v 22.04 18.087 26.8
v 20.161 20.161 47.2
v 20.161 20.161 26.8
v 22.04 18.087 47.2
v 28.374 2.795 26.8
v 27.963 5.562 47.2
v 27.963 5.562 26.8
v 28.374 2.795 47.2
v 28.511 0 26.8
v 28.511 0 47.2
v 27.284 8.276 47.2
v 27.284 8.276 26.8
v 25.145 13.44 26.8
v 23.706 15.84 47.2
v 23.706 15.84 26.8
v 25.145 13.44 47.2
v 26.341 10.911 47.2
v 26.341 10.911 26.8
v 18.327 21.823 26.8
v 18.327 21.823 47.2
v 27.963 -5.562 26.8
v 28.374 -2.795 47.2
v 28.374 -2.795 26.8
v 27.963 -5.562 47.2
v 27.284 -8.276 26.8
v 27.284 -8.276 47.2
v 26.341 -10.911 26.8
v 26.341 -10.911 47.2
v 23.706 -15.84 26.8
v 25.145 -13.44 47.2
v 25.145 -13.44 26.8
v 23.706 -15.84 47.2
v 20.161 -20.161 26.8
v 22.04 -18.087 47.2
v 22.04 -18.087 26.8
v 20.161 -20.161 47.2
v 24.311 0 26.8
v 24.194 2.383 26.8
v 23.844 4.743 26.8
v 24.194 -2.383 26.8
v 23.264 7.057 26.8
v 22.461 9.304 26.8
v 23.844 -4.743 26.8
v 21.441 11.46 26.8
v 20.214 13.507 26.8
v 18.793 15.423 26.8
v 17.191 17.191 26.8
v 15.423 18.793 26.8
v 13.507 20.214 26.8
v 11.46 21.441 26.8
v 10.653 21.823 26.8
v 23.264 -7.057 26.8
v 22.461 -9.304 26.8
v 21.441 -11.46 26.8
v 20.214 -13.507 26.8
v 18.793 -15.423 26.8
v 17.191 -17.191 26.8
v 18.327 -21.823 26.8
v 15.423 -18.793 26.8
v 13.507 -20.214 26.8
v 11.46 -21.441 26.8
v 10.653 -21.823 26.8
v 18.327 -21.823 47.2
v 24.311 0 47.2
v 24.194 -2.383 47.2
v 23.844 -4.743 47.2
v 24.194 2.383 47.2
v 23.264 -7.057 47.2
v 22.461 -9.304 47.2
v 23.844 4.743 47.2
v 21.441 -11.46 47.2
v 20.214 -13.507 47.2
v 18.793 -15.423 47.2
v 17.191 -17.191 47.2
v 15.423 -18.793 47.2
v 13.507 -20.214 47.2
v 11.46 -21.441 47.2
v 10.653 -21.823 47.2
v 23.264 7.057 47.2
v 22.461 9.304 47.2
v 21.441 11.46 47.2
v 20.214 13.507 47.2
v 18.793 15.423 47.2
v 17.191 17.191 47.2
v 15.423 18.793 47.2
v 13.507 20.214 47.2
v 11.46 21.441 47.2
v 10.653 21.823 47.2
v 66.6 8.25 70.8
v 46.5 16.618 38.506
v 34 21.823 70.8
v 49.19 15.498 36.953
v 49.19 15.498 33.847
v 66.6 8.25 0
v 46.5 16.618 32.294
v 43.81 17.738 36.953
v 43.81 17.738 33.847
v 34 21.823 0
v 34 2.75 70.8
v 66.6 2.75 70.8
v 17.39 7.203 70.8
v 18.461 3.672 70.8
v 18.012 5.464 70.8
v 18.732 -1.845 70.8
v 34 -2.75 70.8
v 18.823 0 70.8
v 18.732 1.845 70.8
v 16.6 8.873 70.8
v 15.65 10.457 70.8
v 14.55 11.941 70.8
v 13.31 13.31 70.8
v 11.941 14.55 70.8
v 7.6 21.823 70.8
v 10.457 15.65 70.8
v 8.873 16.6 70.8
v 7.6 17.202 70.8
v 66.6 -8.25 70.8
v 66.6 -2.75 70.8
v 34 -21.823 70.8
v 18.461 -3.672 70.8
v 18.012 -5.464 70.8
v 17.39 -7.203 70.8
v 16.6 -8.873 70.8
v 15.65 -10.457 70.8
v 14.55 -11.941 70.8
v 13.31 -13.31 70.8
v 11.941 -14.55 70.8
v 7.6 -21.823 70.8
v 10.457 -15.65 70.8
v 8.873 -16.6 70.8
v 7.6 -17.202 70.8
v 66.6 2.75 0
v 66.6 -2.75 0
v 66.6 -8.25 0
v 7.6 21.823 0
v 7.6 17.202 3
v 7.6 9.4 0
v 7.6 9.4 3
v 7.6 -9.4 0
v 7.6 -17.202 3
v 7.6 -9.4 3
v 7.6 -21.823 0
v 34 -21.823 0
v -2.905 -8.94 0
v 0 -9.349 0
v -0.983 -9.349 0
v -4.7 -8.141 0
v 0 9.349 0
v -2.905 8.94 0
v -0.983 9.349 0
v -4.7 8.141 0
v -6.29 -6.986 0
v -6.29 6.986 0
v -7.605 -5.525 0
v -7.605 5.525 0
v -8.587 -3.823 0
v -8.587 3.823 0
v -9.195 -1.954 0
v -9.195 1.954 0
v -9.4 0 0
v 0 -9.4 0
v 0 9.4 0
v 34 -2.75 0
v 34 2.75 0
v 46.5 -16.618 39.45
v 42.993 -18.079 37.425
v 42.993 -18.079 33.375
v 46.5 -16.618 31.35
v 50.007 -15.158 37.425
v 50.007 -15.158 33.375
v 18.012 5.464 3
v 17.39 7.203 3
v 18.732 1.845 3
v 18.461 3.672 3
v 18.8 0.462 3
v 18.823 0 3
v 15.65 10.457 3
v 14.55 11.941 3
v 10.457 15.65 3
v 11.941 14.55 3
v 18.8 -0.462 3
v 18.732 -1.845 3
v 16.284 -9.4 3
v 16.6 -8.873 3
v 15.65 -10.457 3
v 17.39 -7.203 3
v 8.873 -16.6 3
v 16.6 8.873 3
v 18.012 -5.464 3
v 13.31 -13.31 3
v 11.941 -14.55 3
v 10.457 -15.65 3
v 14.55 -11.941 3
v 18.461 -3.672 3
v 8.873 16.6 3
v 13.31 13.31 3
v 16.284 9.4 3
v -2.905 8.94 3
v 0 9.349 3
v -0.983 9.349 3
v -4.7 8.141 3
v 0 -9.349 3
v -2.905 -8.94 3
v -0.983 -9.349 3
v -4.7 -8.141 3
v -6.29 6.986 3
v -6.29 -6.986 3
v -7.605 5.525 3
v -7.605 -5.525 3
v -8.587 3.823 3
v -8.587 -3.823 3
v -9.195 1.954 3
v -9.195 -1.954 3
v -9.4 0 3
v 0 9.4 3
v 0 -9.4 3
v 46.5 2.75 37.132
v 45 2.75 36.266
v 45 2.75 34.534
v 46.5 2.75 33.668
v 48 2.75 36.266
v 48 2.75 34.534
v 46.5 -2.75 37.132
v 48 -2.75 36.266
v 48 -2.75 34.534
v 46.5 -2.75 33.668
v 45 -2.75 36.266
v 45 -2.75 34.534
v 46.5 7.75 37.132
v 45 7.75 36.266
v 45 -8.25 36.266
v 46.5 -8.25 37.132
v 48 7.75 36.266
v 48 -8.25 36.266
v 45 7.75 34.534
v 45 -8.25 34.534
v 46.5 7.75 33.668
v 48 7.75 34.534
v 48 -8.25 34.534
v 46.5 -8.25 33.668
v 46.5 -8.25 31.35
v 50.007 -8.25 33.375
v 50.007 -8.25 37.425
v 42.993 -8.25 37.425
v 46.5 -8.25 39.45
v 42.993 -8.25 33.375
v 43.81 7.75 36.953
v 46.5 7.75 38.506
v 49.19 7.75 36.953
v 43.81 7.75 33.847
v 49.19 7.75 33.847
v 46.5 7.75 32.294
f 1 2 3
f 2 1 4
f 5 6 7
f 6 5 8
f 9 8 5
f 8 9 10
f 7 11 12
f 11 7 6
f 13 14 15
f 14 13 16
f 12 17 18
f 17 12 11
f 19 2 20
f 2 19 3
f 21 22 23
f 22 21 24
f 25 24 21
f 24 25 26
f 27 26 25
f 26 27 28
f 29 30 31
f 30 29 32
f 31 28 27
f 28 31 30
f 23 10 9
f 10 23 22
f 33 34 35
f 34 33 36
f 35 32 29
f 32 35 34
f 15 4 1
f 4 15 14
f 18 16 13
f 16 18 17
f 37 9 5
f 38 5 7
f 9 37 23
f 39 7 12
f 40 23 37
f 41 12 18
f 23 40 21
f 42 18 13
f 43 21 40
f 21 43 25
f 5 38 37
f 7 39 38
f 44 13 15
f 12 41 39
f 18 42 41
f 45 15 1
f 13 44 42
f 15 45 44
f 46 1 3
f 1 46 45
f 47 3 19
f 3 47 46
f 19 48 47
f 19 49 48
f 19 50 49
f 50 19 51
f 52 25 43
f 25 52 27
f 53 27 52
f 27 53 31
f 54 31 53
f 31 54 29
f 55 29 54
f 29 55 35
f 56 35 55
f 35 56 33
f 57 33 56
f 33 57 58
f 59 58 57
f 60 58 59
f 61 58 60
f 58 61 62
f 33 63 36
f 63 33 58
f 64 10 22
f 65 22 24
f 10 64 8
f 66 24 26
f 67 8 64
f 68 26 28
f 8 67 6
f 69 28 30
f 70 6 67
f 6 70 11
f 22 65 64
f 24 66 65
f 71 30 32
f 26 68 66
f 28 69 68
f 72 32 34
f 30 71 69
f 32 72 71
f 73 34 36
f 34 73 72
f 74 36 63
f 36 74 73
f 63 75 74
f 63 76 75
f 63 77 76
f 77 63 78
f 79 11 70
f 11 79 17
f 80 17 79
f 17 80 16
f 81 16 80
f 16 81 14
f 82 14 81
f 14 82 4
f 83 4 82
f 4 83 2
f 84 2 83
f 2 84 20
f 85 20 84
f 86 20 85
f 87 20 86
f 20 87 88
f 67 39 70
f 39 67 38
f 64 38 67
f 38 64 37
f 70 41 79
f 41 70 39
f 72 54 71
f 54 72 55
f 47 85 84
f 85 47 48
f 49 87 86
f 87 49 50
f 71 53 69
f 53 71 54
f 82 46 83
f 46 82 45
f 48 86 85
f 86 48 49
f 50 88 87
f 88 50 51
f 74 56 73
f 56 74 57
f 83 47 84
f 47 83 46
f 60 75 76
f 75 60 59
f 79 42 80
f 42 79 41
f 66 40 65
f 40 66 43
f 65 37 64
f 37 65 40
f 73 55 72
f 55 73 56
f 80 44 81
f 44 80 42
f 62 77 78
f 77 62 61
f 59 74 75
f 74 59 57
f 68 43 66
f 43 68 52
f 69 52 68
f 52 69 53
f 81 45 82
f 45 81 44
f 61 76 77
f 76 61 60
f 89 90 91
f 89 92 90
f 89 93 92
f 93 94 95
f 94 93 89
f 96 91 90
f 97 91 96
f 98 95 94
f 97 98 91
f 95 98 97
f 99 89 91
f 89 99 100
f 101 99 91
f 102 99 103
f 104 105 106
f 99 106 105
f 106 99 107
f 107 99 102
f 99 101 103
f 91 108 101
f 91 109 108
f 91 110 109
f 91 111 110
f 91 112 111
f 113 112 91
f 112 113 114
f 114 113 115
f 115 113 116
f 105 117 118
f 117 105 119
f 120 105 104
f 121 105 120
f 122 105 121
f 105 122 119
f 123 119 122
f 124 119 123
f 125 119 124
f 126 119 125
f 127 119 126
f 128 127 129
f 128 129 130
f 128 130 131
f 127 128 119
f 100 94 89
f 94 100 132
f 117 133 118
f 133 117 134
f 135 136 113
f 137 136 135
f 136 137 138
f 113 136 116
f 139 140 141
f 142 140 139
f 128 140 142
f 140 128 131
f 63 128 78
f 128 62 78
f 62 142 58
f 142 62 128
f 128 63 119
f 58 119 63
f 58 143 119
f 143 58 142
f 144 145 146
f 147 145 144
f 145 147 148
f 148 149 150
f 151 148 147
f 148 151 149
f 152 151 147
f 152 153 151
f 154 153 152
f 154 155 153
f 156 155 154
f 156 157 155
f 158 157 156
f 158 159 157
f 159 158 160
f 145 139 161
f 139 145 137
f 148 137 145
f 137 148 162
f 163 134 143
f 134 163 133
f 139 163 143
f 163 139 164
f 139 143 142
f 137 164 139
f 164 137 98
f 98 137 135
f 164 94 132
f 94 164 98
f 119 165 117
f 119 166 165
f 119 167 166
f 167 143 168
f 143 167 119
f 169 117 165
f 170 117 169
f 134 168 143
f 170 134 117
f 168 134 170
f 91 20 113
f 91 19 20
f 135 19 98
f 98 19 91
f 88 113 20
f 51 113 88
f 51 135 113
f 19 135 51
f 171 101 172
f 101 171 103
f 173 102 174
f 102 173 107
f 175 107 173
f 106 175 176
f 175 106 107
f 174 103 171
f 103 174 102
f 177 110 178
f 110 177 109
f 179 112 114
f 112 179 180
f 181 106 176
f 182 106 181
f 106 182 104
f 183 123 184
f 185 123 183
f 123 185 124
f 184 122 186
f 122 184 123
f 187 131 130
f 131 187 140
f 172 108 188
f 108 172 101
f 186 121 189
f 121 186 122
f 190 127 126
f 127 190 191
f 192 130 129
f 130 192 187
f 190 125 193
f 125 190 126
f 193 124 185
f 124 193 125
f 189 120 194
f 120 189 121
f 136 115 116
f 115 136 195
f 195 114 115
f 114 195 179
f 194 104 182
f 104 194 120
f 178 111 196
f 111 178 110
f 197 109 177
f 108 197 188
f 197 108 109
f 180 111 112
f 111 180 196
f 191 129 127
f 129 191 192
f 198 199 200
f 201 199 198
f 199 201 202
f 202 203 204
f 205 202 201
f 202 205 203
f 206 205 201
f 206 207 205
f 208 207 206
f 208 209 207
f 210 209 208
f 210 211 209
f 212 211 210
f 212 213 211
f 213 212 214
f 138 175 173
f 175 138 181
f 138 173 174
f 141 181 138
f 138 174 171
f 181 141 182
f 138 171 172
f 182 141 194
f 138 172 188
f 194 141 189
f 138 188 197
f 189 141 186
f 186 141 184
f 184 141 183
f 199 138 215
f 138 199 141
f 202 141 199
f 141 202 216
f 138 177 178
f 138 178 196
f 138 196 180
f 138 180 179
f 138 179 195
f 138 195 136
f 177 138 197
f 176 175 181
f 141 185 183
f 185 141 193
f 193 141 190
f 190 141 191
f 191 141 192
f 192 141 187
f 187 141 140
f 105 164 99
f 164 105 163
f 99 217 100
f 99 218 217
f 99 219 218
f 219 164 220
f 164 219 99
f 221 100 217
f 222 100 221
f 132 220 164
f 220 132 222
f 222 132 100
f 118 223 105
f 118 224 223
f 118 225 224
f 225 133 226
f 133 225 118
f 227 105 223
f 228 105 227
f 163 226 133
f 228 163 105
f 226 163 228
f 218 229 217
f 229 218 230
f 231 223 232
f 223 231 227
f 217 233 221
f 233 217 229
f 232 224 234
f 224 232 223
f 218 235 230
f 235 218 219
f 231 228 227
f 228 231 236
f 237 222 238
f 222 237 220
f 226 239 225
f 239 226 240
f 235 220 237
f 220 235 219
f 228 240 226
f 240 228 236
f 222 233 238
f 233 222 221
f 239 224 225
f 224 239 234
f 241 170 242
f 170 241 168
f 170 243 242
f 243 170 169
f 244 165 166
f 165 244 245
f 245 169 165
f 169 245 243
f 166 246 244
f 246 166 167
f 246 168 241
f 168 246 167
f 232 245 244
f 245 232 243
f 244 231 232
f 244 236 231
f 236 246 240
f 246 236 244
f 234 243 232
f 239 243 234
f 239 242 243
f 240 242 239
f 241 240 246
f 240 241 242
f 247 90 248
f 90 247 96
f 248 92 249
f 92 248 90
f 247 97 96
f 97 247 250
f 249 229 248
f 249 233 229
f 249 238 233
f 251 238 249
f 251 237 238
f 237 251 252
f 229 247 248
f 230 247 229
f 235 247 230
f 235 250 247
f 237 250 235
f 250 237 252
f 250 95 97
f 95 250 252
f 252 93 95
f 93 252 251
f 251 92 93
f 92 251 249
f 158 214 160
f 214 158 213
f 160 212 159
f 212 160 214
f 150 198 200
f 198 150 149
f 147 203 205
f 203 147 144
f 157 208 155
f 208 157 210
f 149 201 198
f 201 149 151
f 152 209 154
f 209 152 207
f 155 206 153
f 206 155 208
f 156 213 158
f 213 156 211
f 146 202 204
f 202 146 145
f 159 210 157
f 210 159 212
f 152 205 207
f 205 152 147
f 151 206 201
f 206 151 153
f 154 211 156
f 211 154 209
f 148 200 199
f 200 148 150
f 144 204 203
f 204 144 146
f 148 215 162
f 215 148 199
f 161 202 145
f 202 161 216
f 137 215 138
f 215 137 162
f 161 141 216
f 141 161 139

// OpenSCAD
/*
Parametric Mount for Berd-Air MAX motor

For mounting a large high-pressure 12V Vacuum Air pump on a panel of a 3D printer frame, secured with a velcro strap

Designed by Michael Jones [DechAmim] with OpenSCAD v2015.03-2

Originally published on thingiverse.com on February 14, 2018 with a CC-SY license

Thanks for checking out my code!
*/

/* [General] */
//Thickness of the board that the motor is being mounted to (in mm)
board_thick = 5.5;
//Width of the velcro (in mm)
velcro_width = 20;
//Approximate thickness of the velcro (in mm)
velcro_thick = 2;
//Tolerance of the parts
tol = 0.2; //[0:0.5]
//Resolution of the round parts (a lower number will still result in an accurate fit, it will just look less smooth)
seg = 64; //[16:16:64]

/* [Mounting Screw] */
//Diameter of the mounting screw (in mm)
screw_dia = 3;
//Diameter of the head of the mounting screw (in mm)
screw_head_dia = 5.4;
//Width of the mounting screw hexagonal nut (flat-to-flat, in mm)
nut_width = 5.38;
//Thickness of the mounting screw nut (in mm)
nut_thickness = 1.5;

/* [Hidden] */

//Dimensions of the motor
small_dia = 37.6;
large_dia = 60;
small_h = 68;
large_h = 44;
lead_thick = 7.6; //Clearance for the two leads

side_ext = 3; //Amount extending from the sides
holder_length = 60;
ext_depth = 25; //Amount extending down the frame
base_thick = 3; //Thickness of the "base" the motor sits on

function apothem(r,n) = r*cos(180/n);
function circumrad(a,n) = a / cos(180/n);
function circumrad_s(s,n) = s / 2 / sin(180/n);
function poly_side(apo,n) = apo * 2 * tan(180/n);
function pythoside(h,s) = sqrt(pow(h,2)-pow(s,2));

small_r = circumrad(small_dia/2,seg);

velcro_clearance = velcro_thick * 2 + tol;
space_from_board = 4;

board_offset = large_dia/2+space_from_board;

mount_l = board_offset+ext_depth;
mount_w = small_r*2+side_ext*2;
mount_h = small_h+base_thick-tol;

channel_r = small_r+(board_offset-small_r)/2;
channel_w = velcro_width+tol*2;

screw_r = circumrad(screw_dia/2,6);

//This path defines the shape of the main motor mount, and is used for a linear extrusion in the main motor_mount module below
path = [[lead_thick,-mount_w/2],[board_offset,-mount_w/2],[mount_l+lead_thick,-board_thick*1.5],[mount_l+lead_thick,board_thick*1.5],[board_offset,mount_w/2],[lead_thick,mount_w/2]];

module hollow_cyl(r_out,r_in,h,center=false,fn=seg){
    difference(){
        cylinder(h=h,r=r_out,center=center,$fn=fn);
        translate([0,0,center==false ? -0.1 : 0]) cylinder(h=h+0.2,r=r_in,center=center,$fn=fn);
    }
}

module motor(dummy = false){
    small_rd = dummy == false ? circumrad(small_dia/2,seg) : small_dia/2;
    
     
    cylinder(h=small_h,r=small_rd,$fn = dummy == false ? seg : seg*4);
    if(dummy==true) translate([0,0,small_h]) cylinder(h=large_h,d=large_dia,$fn=seg*4);
}


module bottom_support(){
    cylinder(h=base_thick,r=small_dia/4);
    translate([0,-small_dia/4,0]) cube([small_dia/2,small_dia/2,base_thick]);
}

module motor_mount(){
    difference(){
        linear_extrude(height=mount_h) polygon(path);
        translate([0,0,base_thick]) motor();
        translate([0,0,base_thick+small_h/2-channel_w/2]) hollow_cyl(r_in=channel_r-velcro_clearance/2,r_out=channel_r+velcro_clearance/2,h=channel_w);

        translate([board_offset,-board_thick/2,-tol]) cube([mount_l,board_thick,mount_h+tol*2]);
        
        translate([board_offset+ext_depth/2,0,mount_h/2]) rotate([90,0,0]) rotate([0,0,360/12]) cylinder(r=screw_r,h=mount_w,$fn=6,center=true);
        translate([board_offset+ext_depth/2,-mount_w/2-board_thick*1.5,mount_h/2]) rotate([90,0,0]) rotate([0,0,360/12]) cylinder(d=screw_head_dia*1.5,h=mount_w,$fn=6,center=true);
        translate([board_offset+ext_depth/2,mount_w/2+board_thick/2+5,mount_h/2]) rotate([90,0,0]) rotate([0,0,360/12]) cylinder(r=circumrad(nut_width/2,6),h=mount_w,$fn=6,center=true);
    }
    
    bottom_support();
}

motor_mount();
//To visualize the motor inside the motor mount, uncomment the line below
//%translate([0,0,base_thick]) motor(true);
